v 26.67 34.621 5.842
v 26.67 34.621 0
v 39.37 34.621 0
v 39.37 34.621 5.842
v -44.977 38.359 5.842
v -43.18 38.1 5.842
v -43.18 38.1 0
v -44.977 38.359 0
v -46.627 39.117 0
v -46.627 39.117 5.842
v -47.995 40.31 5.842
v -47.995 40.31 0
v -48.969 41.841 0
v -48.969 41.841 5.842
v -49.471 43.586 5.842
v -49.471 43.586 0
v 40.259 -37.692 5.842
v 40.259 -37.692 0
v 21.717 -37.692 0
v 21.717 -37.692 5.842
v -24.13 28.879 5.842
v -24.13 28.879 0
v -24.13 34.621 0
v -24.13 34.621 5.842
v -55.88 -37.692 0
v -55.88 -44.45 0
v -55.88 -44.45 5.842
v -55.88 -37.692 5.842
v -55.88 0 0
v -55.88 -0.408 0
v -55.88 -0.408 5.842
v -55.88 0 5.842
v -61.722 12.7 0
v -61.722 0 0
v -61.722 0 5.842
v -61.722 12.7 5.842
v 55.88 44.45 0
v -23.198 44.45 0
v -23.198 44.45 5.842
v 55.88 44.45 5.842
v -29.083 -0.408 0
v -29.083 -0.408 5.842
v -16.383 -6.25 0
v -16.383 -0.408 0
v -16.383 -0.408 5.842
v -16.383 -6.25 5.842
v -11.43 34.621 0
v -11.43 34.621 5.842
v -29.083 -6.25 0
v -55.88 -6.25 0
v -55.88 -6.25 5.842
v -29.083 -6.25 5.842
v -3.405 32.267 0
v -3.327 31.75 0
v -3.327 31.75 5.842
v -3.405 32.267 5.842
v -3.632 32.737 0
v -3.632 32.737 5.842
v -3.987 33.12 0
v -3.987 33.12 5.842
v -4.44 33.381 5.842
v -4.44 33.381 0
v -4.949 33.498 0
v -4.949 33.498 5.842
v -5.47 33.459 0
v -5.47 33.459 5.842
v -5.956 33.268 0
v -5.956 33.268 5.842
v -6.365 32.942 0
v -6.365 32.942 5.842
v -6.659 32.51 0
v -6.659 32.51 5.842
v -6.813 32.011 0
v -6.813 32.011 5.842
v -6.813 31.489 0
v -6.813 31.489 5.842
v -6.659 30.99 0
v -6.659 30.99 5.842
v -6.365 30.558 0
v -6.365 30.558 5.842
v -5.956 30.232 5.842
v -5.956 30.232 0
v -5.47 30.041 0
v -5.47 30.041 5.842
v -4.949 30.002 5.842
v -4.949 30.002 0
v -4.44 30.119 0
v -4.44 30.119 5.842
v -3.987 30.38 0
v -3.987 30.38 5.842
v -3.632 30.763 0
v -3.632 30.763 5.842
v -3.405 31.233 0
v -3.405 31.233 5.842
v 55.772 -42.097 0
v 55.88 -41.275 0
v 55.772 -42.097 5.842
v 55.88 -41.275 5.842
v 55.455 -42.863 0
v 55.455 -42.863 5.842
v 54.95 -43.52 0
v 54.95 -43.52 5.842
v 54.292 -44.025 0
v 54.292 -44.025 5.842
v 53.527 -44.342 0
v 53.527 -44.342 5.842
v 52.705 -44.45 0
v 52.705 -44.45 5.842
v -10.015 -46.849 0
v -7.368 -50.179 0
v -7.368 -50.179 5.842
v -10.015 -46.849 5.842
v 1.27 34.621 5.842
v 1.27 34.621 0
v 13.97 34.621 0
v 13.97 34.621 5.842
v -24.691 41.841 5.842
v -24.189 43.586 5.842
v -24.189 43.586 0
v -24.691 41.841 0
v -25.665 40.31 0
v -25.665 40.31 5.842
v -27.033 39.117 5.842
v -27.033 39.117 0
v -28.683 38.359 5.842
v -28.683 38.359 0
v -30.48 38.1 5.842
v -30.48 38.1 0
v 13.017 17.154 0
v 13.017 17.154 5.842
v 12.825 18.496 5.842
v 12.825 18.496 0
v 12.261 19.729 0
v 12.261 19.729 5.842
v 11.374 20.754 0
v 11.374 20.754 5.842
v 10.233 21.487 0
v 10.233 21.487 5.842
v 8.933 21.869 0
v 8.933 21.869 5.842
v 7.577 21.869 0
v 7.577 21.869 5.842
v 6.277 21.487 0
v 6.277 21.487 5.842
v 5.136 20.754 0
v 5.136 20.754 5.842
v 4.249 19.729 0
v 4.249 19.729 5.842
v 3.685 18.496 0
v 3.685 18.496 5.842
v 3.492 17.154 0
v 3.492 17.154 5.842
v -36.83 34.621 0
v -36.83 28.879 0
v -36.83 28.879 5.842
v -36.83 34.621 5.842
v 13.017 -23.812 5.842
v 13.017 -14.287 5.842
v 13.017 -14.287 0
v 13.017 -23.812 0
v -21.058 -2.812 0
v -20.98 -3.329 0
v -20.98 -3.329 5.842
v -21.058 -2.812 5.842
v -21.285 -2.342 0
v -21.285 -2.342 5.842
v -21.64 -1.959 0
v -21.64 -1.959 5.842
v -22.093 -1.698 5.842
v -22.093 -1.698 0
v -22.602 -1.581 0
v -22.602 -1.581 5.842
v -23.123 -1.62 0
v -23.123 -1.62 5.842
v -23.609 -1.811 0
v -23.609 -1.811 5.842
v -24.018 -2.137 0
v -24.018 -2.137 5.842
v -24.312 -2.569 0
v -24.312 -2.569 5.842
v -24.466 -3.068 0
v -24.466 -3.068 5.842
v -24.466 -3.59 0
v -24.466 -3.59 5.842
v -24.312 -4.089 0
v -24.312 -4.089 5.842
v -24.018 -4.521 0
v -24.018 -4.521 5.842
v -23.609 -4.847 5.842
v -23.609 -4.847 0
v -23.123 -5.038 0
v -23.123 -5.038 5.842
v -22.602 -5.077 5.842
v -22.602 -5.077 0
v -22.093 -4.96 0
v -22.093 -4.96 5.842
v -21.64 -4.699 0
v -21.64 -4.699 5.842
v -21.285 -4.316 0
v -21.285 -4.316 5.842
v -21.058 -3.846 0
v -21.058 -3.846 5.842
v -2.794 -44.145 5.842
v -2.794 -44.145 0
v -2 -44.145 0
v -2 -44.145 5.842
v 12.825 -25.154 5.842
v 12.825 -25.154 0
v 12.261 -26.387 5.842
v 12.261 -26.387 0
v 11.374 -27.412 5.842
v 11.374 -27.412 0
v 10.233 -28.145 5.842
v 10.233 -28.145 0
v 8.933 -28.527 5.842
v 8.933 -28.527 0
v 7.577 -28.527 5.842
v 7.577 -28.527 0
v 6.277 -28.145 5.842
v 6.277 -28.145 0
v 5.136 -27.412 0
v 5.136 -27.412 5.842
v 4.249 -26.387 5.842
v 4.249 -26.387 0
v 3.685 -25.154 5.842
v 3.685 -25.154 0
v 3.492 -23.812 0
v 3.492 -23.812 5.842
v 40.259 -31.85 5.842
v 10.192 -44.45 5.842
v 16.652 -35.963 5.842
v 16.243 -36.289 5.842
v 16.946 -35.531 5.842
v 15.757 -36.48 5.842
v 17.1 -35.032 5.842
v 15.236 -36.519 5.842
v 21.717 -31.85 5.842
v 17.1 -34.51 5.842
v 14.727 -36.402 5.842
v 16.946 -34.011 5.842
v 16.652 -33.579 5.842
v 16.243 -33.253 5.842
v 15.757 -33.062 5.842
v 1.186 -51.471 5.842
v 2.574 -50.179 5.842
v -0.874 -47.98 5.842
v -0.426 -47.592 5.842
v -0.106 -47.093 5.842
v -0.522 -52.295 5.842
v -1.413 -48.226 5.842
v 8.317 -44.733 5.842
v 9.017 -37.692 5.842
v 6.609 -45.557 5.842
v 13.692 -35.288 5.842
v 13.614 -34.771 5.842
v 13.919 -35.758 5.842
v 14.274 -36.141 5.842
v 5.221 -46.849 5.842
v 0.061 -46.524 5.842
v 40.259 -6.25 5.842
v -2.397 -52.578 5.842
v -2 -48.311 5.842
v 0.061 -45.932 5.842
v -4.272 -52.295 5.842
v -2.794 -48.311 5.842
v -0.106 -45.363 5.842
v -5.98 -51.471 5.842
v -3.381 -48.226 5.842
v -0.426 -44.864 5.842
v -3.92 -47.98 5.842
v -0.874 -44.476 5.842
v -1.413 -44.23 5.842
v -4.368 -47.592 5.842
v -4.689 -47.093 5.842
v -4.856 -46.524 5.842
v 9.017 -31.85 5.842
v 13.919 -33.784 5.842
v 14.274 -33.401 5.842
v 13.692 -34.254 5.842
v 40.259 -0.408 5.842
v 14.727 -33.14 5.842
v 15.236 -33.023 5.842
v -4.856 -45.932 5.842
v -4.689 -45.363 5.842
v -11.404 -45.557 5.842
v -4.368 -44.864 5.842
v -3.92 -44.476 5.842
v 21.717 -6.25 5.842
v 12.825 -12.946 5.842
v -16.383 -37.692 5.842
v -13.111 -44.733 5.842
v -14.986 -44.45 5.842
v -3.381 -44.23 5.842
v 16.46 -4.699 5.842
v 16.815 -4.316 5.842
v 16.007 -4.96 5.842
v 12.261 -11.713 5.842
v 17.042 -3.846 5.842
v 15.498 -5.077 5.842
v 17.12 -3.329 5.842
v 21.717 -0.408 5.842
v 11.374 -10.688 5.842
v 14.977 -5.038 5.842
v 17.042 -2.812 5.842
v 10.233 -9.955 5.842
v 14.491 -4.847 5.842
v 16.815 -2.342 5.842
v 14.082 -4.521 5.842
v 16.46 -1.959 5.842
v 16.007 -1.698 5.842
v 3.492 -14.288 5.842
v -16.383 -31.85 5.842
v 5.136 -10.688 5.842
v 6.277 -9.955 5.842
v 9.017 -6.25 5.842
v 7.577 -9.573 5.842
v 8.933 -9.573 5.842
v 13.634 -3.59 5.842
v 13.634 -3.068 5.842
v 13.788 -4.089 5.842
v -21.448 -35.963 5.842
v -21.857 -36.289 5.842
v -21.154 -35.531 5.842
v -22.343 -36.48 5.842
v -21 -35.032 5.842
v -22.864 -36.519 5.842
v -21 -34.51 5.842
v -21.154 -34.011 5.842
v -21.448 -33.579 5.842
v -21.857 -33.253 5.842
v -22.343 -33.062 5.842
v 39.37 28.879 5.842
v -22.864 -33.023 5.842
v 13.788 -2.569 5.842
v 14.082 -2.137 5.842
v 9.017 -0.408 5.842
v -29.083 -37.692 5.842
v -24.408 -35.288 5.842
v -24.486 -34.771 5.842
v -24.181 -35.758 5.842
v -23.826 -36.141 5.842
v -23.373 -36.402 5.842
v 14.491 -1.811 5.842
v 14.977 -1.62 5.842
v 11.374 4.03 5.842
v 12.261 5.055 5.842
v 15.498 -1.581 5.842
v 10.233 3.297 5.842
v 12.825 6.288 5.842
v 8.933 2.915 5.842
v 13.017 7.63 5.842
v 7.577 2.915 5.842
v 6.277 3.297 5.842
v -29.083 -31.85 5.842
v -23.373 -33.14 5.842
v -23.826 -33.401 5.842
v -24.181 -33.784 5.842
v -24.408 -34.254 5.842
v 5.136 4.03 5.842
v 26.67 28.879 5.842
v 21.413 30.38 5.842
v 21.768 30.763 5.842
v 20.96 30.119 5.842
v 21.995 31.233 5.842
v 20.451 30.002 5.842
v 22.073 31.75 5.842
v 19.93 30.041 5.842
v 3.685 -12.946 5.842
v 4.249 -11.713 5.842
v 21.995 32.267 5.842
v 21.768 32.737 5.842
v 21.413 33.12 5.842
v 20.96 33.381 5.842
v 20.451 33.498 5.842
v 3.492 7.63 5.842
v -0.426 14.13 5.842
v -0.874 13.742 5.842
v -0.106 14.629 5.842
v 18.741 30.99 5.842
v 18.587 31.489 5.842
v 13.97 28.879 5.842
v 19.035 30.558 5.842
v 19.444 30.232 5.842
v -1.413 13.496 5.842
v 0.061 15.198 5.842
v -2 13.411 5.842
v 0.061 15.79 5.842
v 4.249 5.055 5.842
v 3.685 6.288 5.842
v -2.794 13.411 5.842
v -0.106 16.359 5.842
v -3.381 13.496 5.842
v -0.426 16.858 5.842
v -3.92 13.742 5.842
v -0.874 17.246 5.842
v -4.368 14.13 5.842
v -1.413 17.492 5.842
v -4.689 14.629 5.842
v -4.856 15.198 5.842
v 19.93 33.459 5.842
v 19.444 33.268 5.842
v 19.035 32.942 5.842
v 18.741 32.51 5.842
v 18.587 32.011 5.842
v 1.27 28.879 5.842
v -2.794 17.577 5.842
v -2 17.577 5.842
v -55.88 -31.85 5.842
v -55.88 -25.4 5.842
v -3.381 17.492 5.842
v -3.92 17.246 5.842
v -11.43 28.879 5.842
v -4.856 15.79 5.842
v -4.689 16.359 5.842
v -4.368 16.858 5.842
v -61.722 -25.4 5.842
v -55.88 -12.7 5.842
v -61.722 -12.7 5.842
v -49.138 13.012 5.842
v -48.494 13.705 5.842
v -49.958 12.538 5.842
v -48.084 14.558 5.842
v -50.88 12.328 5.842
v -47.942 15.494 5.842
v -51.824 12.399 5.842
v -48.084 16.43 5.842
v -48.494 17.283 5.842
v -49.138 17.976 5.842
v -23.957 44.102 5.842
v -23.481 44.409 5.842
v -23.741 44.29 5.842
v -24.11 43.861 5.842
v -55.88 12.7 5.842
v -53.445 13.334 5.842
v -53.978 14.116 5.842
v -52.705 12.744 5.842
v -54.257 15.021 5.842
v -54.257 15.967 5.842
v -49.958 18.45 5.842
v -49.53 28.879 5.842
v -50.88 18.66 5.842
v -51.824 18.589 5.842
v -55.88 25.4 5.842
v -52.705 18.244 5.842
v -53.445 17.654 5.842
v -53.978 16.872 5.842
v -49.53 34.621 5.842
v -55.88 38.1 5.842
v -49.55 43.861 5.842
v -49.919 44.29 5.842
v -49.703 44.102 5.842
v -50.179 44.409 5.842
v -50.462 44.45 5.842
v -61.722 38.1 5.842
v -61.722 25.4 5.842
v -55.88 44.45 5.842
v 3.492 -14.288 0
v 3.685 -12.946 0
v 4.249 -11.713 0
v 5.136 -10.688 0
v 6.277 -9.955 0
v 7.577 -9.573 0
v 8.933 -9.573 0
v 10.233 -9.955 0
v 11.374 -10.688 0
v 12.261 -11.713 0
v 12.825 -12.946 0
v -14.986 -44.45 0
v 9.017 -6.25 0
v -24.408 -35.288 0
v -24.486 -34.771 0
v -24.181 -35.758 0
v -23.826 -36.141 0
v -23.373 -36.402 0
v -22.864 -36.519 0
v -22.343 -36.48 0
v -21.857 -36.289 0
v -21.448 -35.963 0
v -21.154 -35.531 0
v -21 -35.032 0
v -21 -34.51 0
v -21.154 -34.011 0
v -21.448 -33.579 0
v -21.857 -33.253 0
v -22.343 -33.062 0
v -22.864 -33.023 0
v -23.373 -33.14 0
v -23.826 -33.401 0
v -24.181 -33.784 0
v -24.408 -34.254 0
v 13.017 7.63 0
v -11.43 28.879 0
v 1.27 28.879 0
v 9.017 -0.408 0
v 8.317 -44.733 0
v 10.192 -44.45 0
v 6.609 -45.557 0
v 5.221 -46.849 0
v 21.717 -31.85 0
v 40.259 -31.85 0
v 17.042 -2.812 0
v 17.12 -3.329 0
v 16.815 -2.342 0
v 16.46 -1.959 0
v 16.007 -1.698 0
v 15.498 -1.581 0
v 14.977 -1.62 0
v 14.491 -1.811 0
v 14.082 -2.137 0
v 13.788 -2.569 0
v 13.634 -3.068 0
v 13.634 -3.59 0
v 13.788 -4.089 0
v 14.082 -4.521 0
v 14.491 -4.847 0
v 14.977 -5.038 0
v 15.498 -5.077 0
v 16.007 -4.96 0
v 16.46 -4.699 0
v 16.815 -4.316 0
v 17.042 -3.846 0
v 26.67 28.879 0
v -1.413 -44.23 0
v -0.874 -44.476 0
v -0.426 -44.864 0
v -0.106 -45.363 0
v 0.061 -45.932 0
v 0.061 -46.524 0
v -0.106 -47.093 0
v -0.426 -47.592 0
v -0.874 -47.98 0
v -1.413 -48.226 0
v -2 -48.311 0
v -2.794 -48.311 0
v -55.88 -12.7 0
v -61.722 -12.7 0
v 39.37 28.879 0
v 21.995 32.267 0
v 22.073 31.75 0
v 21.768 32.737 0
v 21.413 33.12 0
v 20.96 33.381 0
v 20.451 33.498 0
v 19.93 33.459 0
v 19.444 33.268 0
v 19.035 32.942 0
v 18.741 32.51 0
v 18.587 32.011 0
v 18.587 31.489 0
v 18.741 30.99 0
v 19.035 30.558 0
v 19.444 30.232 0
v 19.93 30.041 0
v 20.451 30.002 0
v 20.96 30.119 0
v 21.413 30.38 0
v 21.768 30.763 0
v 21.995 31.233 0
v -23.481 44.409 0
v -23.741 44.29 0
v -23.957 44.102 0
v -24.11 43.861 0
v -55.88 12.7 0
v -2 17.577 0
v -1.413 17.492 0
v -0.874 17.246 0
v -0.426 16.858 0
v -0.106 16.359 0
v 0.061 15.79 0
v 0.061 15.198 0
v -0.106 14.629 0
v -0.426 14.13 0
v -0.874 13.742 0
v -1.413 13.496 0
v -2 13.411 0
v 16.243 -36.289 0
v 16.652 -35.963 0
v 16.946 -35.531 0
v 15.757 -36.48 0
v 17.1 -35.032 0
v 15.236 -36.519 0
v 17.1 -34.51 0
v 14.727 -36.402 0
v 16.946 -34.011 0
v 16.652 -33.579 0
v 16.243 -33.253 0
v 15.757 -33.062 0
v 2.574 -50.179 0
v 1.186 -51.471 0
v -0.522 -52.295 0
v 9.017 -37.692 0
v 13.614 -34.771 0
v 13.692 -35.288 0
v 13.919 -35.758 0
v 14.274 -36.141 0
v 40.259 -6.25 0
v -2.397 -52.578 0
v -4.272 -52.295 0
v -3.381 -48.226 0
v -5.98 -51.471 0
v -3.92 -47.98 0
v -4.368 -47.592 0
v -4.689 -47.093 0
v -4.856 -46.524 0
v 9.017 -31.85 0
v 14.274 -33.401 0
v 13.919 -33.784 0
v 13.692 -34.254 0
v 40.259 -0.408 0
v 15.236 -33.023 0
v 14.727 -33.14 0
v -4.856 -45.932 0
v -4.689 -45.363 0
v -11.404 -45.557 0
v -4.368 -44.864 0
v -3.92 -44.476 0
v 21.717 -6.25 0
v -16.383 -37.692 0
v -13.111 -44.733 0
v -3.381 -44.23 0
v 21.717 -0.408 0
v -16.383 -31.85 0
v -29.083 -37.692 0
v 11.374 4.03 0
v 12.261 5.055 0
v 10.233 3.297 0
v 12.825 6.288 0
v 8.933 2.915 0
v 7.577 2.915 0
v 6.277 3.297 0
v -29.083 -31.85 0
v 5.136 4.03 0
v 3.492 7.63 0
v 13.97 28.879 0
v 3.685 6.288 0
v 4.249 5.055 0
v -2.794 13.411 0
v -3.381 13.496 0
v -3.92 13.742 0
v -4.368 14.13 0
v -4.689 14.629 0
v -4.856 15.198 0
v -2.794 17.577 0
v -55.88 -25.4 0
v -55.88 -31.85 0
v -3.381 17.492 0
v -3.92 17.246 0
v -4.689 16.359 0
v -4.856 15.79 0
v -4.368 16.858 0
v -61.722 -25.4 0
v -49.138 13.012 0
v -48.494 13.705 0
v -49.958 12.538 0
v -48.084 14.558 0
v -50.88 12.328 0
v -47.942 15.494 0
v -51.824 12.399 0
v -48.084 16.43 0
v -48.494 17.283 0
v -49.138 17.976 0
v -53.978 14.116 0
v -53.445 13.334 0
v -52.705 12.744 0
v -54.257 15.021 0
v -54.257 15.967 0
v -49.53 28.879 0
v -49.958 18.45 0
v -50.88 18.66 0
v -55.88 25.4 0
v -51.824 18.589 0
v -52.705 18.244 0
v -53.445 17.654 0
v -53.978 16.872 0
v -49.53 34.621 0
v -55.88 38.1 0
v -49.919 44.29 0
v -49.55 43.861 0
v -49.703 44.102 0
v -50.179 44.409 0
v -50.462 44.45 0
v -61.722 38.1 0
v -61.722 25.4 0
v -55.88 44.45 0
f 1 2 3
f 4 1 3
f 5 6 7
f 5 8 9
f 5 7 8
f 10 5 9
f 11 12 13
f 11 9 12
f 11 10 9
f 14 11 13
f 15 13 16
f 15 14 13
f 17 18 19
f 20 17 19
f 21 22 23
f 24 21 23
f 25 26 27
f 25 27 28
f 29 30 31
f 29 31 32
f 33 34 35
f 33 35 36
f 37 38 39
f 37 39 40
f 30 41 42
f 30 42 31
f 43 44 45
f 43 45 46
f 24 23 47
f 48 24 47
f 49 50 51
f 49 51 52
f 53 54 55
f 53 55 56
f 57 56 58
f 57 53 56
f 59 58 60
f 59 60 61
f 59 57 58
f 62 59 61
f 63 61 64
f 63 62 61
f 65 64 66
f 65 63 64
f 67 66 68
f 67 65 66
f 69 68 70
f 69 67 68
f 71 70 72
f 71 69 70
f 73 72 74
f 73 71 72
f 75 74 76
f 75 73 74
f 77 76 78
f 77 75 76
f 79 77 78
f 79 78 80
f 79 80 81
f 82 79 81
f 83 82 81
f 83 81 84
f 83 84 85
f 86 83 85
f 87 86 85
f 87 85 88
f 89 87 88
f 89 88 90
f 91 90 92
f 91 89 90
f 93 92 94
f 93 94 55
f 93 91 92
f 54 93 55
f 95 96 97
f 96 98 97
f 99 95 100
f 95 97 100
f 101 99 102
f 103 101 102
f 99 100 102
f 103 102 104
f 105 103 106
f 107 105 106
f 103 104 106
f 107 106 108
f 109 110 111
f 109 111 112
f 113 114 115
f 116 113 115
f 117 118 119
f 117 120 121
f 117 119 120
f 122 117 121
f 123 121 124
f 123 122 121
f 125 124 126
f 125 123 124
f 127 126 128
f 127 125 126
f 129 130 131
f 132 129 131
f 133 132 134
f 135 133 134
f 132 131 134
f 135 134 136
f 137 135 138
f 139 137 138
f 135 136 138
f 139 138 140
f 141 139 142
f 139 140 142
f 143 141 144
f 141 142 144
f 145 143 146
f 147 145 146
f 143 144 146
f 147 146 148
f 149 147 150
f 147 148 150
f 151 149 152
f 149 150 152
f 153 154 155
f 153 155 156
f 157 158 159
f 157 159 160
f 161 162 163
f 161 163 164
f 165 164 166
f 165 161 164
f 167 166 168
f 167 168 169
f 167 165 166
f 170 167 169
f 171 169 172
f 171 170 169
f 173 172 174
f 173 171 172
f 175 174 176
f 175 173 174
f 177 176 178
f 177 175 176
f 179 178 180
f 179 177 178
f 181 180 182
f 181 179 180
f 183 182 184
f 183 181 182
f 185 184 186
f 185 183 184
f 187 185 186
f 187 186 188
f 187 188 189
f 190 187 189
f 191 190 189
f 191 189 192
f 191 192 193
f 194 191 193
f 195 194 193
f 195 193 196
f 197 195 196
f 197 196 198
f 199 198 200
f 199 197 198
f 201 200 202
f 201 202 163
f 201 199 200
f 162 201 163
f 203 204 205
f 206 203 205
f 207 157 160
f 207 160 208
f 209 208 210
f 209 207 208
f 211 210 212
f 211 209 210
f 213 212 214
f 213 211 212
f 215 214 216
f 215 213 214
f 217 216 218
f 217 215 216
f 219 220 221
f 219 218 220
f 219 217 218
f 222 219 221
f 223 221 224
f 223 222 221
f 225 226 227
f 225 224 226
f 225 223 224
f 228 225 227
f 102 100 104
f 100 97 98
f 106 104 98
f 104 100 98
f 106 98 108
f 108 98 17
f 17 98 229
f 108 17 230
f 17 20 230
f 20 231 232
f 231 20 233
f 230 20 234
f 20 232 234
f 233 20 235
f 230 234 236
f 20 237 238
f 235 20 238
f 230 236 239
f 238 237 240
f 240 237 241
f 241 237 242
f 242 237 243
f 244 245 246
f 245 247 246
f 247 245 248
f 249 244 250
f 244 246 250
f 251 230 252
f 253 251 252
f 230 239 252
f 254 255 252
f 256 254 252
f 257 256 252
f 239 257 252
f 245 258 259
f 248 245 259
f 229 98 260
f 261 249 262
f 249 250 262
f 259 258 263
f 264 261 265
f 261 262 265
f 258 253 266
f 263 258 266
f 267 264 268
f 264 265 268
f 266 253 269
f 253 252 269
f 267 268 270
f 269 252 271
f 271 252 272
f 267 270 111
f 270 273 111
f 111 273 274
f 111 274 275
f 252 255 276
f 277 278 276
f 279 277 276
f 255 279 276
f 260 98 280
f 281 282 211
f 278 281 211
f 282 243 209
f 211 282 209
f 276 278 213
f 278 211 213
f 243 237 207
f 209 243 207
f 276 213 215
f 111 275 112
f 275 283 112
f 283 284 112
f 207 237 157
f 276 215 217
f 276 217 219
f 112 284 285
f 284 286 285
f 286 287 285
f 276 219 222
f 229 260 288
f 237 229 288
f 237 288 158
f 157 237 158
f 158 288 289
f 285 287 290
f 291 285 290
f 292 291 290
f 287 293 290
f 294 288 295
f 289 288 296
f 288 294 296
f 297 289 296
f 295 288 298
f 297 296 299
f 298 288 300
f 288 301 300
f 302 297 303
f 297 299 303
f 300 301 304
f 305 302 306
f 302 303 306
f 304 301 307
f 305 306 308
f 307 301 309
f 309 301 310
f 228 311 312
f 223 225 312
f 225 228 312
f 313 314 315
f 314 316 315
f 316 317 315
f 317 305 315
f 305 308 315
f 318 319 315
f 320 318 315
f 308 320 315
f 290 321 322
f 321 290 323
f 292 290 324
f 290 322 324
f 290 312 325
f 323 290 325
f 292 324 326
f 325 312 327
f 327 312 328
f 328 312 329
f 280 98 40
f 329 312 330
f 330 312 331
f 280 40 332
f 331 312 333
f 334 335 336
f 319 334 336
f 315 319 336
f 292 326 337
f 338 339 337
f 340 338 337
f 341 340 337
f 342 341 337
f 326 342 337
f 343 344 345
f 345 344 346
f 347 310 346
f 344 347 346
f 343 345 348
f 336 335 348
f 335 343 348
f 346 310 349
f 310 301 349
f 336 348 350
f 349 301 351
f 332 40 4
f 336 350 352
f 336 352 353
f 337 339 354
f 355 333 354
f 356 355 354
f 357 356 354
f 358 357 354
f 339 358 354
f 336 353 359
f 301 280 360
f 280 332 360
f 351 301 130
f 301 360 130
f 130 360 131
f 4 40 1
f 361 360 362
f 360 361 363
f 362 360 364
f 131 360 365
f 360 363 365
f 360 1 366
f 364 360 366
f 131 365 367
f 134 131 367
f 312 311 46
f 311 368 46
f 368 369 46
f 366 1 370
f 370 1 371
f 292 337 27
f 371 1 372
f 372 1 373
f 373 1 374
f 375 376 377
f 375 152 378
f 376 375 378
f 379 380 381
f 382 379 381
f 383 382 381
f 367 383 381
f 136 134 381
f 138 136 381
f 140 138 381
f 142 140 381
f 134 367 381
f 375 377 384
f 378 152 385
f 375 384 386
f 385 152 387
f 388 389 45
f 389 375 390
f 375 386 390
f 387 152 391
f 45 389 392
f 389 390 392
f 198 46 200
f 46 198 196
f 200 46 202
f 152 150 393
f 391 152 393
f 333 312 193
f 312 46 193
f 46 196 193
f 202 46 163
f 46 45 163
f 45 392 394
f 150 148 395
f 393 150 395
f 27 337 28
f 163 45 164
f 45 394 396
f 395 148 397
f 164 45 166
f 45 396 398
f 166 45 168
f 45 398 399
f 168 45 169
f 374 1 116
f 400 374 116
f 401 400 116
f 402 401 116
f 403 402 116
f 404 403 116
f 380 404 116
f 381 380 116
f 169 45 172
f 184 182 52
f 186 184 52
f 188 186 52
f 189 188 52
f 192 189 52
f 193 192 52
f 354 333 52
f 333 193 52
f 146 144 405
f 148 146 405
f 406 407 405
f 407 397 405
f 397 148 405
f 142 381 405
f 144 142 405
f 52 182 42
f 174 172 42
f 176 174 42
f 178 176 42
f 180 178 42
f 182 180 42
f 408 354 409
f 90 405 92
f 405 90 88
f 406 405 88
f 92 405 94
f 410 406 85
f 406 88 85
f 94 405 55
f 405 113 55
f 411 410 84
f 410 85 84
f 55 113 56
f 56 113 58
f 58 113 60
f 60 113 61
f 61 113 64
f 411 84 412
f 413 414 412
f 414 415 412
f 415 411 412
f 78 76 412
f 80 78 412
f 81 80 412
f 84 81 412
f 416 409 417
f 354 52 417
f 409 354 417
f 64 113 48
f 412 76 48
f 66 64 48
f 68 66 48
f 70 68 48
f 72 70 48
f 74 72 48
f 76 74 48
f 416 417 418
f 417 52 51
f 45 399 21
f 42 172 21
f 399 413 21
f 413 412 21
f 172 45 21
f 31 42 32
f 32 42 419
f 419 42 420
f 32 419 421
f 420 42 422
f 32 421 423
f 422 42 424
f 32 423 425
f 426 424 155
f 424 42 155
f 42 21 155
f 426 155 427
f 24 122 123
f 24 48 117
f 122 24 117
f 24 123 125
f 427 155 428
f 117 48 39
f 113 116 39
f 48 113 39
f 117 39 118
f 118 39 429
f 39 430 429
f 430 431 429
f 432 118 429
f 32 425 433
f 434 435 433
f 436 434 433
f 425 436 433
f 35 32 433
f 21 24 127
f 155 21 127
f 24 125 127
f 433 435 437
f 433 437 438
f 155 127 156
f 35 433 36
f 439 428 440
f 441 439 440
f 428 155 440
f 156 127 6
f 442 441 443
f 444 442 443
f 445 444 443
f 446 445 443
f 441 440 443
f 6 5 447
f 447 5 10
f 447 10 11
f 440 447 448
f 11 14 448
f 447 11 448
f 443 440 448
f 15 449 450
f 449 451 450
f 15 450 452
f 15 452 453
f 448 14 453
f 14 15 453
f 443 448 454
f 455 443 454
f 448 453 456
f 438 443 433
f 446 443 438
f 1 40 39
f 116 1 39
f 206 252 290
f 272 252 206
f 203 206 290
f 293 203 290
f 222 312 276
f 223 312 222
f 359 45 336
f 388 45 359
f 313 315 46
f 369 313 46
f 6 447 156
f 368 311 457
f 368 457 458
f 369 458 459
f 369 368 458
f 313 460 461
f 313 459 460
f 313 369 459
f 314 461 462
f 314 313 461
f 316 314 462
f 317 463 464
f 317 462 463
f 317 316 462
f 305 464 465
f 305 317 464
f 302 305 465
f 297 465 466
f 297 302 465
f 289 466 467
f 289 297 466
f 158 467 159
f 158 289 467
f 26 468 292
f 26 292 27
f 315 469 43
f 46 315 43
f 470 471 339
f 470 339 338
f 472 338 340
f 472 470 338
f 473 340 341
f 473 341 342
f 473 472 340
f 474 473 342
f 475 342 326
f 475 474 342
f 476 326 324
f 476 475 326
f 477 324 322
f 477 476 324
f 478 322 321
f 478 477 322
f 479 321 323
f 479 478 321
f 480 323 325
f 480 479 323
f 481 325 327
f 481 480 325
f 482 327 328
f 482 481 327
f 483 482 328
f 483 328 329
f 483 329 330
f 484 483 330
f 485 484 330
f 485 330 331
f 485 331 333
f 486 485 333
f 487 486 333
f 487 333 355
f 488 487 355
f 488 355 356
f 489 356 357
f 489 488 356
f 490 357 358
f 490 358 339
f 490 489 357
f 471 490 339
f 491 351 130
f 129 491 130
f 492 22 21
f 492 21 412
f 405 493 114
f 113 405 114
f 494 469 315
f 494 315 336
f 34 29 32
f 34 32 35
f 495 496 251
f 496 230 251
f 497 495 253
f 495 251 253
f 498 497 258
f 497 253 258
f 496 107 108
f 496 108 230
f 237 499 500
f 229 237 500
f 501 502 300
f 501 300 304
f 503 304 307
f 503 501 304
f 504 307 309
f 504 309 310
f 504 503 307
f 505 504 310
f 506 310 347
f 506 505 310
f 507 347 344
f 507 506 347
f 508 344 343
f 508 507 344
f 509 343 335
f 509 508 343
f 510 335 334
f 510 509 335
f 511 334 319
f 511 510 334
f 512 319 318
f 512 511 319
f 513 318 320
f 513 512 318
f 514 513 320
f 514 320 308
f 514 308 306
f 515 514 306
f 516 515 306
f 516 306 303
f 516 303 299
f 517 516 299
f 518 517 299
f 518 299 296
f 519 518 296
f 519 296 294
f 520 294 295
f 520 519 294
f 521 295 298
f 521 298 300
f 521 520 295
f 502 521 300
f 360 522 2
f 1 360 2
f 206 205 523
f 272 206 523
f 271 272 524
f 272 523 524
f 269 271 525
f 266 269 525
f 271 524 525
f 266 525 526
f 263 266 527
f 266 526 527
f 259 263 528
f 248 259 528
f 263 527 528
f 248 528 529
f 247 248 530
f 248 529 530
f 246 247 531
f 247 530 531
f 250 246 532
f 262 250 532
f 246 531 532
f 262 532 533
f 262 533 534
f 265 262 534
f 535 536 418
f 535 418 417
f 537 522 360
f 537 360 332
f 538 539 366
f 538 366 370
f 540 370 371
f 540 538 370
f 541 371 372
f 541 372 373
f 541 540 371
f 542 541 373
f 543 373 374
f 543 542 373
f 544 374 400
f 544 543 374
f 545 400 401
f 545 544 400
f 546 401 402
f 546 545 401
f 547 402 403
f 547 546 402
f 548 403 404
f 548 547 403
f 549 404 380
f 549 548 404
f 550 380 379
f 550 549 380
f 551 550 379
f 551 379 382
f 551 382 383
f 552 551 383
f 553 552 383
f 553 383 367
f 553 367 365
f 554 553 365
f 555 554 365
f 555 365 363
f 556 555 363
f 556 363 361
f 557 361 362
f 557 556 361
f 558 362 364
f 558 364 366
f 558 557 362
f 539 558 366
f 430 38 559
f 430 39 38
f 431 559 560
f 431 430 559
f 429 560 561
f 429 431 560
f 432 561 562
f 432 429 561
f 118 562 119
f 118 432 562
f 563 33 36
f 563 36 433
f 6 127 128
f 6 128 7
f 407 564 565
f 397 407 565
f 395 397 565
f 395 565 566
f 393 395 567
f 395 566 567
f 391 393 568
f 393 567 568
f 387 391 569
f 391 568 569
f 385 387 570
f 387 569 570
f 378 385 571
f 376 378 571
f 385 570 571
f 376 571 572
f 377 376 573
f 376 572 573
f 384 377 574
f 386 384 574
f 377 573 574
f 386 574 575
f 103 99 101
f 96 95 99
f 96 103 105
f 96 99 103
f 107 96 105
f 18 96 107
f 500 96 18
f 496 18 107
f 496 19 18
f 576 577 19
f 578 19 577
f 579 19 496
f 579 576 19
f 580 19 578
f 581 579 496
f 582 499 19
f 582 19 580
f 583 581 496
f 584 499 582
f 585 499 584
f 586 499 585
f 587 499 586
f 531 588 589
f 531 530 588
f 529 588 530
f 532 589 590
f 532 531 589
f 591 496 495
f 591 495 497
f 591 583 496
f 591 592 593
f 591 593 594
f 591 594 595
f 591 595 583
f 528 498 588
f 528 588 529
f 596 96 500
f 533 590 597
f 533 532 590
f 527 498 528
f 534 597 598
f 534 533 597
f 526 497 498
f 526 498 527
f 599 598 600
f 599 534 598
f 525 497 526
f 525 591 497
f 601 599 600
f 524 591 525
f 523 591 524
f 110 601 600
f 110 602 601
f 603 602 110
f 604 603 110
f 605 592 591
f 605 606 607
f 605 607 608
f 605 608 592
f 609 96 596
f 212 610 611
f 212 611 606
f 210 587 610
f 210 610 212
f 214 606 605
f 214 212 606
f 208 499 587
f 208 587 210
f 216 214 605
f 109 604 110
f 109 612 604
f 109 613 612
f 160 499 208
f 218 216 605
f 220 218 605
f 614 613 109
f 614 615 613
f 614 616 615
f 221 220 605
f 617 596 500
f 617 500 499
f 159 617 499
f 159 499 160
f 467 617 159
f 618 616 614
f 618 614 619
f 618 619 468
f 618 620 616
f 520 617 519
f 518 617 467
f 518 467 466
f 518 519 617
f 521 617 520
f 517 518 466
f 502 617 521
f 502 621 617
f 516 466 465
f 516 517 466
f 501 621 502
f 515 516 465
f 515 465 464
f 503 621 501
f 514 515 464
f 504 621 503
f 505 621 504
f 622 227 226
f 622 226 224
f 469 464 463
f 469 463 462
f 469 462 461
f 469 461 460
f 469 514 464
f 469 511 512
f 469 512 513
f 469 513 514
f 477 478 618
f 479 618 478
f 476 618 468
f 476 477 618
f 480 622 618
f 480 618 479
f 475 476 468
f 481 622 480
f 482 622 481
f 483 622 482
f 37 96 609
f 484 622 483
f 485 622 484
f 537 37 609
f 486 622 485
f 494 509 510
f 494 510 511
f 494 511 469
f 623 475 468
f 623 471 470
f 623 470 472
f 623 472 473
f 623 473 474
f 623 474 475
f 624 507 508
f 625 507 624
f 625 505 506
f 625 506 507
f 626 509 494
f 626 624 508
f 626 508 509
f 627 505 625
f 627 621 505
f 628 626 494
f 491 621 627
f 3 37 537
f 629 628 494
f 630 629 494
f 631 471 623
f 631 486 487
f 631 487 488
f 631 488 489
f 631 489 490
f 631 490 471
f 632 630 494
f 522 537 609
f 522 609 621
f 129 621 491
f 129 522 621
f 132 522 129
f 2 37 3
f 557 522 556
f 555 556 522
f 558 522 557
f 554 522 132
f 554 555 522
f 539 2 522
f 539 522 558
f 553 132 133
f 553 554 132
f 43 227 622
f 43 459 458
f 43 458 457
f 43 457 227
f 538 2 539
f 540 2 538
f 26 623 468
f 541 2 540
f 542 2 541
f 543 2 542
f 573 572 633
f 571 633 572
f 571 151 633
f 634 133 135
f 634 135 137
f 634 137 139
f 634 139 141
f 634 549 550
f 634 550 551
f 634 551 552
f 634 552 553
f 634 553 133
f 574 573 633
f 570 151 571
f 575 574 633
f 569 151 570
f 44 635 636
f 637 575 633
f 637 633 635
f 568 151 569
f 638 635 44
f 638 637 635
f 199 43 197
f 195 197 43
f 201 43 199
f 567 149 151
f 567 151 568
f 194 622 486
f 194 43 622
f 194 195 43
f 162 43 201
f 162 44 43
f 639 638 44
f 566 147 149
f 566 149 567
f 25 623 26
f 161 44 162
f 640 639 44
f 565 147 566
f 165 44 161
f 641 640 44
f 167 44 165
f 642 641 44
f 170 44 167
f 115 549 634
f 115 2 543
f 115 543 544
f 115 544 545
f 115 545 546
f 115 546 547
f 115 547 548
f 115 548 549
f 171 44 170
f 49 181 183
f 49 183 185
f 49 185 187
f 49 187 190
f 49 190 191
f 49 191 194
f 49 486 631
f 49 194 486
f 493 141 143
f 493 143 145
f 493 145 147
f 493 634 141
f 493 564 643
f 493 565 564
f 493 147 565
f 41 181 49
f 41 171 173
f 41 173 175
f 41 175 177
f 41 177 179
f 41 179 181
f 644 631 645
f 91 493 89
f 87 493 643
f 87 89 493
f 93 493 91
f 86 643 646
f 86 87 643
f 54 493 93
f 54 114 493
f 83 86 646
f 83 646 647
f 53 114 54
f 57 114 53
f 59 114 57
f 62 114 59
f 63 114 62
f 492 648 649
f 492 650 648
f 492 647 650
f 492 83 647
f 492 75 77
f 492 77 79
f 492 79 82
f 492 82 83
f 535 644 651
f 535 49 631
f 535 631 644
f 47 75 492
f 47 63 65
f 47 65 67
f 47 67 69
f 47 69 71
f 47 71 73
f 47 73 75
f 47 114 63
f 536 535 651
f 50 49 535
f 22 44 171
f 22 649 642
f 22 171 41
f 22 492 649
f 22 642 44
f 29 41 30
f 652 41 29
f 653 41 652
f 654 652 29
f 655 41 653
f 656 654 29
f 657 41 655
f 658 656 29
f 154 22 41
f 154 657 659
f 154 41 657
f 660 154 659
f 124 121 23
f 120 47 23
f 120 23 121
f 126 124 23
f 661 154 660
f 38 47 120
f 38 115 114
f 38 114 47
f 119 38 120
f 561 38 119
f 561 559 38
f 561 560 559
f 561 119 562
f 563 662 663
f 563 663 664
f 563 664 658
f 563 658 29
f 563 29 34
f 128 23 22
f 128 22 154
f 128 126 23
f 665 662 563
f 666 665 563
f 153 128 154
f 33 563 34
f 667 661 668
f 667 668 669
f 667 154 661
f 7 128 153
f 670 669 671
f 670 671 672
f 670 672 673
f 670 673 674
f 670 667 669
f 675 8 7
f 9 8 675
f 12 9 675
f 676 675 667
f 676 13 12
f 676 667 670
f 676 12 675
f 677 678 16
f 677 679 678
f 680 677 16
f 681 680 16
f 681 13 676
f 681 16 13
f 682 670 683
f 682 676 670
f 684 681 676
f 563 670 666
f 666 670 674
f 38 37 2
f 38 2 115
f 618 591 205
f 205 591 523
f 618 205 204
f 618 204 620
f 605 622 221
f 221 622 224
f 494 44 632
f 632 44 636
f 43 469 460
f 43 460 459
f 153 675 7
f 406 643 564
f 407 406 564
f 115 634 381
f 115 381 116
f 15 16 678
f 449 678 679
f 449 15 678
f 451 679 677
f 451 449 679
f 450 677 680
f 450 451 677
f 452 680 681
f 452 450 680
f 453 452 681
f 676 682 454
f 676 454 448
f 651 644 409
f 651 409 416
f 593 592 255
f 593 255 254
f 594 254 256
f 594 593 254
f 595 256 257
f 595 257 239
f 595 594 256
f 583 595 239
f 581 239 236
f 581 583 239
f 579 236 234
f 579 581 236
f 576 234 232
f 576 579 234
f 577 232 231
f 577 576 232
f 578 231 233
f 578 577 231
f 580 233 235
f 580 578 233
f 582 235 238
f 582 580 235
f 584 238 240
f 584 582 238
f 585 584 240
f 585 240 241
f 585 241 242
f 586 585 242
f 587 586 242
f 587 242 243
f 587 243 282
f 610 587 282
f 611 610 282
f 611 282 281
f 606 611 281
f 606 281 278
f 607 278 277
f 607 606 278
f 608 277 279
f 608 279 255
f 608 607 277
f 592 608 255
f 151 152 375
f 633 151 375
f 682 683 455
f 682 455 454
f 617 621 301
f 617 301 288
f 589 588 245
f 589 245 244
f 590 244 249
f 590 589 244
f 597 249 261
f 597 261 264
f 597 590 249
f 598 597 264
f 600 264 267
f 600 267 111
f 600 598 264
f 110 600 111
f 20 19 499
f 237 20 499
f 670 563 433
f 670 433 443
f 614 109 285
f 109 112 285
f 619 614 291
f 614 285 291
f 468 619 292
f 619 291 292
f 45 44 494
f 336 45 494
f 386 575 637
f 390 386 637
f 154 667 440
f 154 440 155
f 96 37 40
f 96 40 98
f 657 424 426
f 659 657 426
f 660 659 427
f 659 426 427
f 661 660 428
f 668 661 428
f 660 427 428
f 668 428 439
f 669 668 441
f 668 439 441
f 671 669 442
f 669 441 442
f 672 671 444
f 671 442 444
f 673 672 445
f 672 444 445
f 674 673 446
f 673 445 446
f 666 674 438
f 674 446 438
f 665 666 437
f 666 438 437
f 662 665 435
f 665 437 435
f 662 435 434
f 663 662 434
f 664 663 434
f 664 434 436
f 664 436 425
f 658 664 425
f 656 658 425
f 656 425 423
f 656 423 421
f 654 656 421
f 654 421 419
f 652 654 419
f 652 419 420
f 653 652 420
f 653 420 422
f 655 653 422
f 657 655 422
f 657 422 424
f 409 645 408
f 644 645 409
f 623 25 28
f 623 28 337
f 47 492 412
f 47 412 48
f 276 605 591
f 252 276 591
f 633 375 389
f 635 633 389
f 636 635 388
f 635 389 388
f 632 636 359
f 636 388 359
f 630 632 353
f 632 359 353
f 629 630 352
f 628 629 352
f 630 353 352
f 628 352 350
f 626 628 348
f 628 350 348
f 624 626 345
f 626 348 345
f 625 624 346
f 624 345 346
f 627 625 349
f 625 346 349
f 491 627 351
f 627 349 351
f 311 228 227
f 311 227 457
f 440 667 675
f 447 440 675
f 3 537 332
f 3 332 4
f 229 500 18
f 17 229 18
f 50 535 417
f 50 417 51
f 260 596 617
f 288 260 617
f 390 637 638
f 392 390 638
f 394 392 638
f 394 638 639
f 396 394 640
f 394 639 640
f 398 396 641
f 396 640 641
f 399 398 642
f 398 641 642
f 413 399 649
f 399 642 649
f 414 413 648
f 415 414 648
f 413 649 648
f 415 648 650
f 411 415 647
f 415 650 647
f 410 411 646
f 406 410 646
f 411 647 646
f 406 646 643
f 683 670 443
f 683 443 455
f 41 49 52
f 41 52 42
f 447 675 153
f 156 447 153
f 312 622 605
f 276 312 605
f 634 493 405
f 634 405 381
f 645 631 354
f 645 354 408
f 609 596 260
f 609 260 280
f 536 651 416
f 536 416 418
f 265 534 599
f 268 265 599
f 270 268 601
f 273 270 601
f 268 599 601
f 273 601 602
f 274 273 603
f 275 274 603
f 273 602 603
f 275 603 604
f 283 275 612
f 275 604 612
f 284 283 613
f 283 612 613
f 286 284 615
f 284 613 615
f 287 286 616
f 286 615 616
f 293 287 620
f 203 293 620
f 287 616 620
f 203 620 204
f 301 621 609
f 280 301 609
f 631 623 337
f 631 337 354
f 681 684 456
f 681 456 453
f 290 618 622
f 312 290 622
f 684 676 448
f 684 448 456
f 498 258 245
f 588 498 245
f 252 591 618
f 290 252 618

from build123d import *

# Parameters (mm, degrees)
SKETCH1_R           = 1.7526
SKETCH1_W           = 12.7
SKETCH1_H           = 5.742
BOSS_EXTRUDE1_DEPTH = 5.842
SKETCH2_R           = 3.175
CUT_EXTRUDE1_DEPTH  = 82.290714919
FILLET1_R           = 6.35
CUT_EXTRUDE2_DEPTH  = 82.290714919
FILLET2_R           = 1
FILLET3_R           = 3.175
CUT_EXTRUDE3_DEPTH  = 82.290714919


with BuildPart() as part:
    # Sketch1 → Boss-Extrude1 (new body)
    with BuildSketch(Plane.XY):
        with BuildLine():
            Line((-61.722, 0), (-61.722, 12.7))
            Line((-61.722, 12.7), (-55.88, 12.7))
            Line((-55.88, 12.7), (-55.88, 25.4))
            Line((-55.88, 25.4), (-61.722, 25.4))
            Line((-61.722, 25.4), (-61.722, 38.1))
            Line((-61.722, 38.1), (-55.88, 38.1))
            Line((-55.88, 38.1), (-55.88, 44.45))
            Line((-55.88, 44.45), (55.88, 44.45))
            Line((55.88, 44.45), (55.88, -44.45))
            Line((55.88, -44.45), (7.127875, -44.45))
            Line((7.127875, -44.45), (2.573780292, -50.179278348))
            ThreePointArc((2.573780292, -50.179278348), (-2.397125, -52.578), (-7.368030292, -50.179278348))
            Line((-7.368030292, -50.179278348), (-11.922125, -44.45))
            Line((-11.922125, -44.45), (-55.88, -44.45))
            Line((-55.88, -44.45), (-55.88, -37.692))
            Line((-55.88, -37.692), (-29.083, -37.692))
            Line((-29.083, -37.692), (-29.083, -31.85))
            Line((-29.083, -31.85), (-55.88, -31.85))
            Line((-55.88, -31.85), (-55.88, -25.4))
            Line((-55.88, -25.4), (-61.722, -25.4))
            Line((-61.722, -25.4), (-61.722, -12.7))
            Line((-61.722, -12.7), (-55.88, -12.7))
            Line((-55.88, -12.7), (-55.88, -6.25))
            Line((-55.88, -6.25), (-29.083, -6.25))
            Line((-29.083, -6.25), (-29.083, -0.408))
            Line((-29.083, -0.408), (-55.88, -0.408))
            Line((-55.88, -0.408), (-55.88, 0))
            Line((-55.88, 0), (-61.722, 0))
        make_face()
        with Locations((-22.733, -3.329)):
            Circle(SKETCH1_R, mode=Mode.SUBTRACT)
        with Locations((15.367, -3.329)):
            Circle(SKETCH1_R, mode=Mode.SUBTRACT)
        with Locations(Location((15.367, -34.771, 0), (0, 0, 180))):
            Circle(SKETCH1_R, mode=Mode.SUBTRACT)
        with Locations(Location((-22.733, -34.771, 0), (0, 0, 180))):
            Circle(SKETCH1_R, mode=Mode.SUBTRACT)
        with Locations((-5.08, 31.75)):
            Circle(SKETCH1_R, mode=Mode.SUBTRACT)
        with Locations((20.32, 31.75)):
            Circle(SKETCH1_R, mode=Mode.SUBTRACT)
        Polygon((9.017, -0.408), (-10.541, -0.408), (-16.383, -0.408), (-16.383, -6.25), (-10.541, -6.25), (9.017, -6.25), align=None, mode=Mode.SUBTRACT)
        Polygon((27.559, -0.408), (21.717, -0.408), (21.717, -6.25), (27.559, -6.25), (40.259, -6.25), (40.259, -0.408), align=None, mode=Mode.SUBTRACT)
        Polygon((21.717, -37.692), (21.717, -31.85), (27.559, -31.85), (40.259, -31.85), (40.259, -37.692), (27.559, -37.692), align=None, mode=Mode.SUBTRACT)
        Polygon((-16.383, -37.692), (-16.383, -31.85), (-10.541, -31.85), (9.017, -31.85), (9.017, -37.692), (-10.541, -37.692), align=None, mode=Mode.SUBTRACT)
        with BuildLine():
            Line((-2.794, -44.1452), (-2.00025, -44.1452))
            ThreePointArc((-2.00025, -44.1452), (0.08255, -46.228), (-2.00025, -48.3108))
            Line((-2.00025, -48.3108), (-2.794, -48.3108))
            ThreePointArc((-2.794, -48.3108), (-4.8768, -46.228), (-2.794, -44.1452))
        make_face(mode=Mode.SUBTRACT)
        with BuildLine():
            Line((-2.794, 17.5768), (-2.00025, 17.5768))
            ThreePointArc((-2.00025, 17.5768), (0.08255, 15.494), (-2.00025, 13.4112))
            Line((-2.00025, 13.4112), (-2.794, 13.4112))
            ThreePointArc((-2.794, 13.4112), (-4.8768, 15.494), (-2.794, 17.5768))
        make_face(mode=Mode.SUBTRACT)
        with Locations((-17.78, 31.75)):
            Rectangle(SKETCH1_W, SKETCH1_H, mode=Mode.SUBTRACT)
        with Locations((-43.18, 31.75)):
            Rectangle(SKETCH1_W, SKETCH1_H, mode=Mode.SUBTRACT)
        with Locations((7.62, 31.75)):
            Rectangle(SKETCH1_W, SKETCH1_H, mode=Mode.SUBTRACT)
        with Locations((33.02, 31.75)):
            Rectangle(SKETCH1_W, SKETCH1_H, mode=Mode.SUBTRACT)
    extrude(amount=BOSS_EXTRUDE1_DEPTH)

    # Sketch2 → Cut-Extrude1 (cut, through all)
    with BuildSketch(Plane.XY.offset(5.842)):
        with Locations((-51.1175, 15.494)):
            Circle(SKETCH2_R)
    extrude(amount=-CUT_EXTRUDE1_DEPTH, mode=Mode.SUBTRACT)

    # Fillet1
    fillet1_edges = [part.edges().sort_by_distance(p)[0] for p in [
        (7.127875, -44.45, 2.921),
        (-11.922125, -44.45, 2.921),
    ]]
    fillet(fillet1_edges, radius=FILLET1_R)

    # Sketch4 → Cut-Extrude2 (cut, through all)
    with BuildSketch(Plane.XY.offset(5.842)):
        with BuildLine():
            Line((-43.18, 50.8), (-30.48, 50.8))
            ThreePointArc((-30.48, 50.8), (-24.13, 44.45), (-30.48, 38.1))
            Line((-30.48, 38.1), (-43.18, 38.1))
            ThreePointArc((-43.18, 38.1), (-49.53, 44.45), (-43.18, 50.8))
        make_face()
    extrude(amount=-CUT_EXTRUDE2_DEPTH, mode=Mode.SUBTRACT)

    # Fillet2
    fillet2_edges = [part.edges().sort_by_distance(p)[0] for p in [
        (-24.13, 44.45, 2.921),
        (-49.53, 44.45, 2.921),
    ]]
    fillet(fillet2_edges, radius=FILLET2_R)

    # Fillet3
    fillet3_edges = [part.edges().sort_by_distance(p)[0] for p in [
        (55.88, -44.45, 2.921),
    ]]
    fillet(fillet3_edges, radius=FILLET3_R)

    # Sketch5 → Cut-Extrude3 (cut, through all)
    with BuildSketch(Plane.XY.offset(5.842)):
        with BuildLine():
            Line((3.4925, -23.8125), (3.4925, -14.2875))
            ThreePointArc((3.4925, -14.2875), (8.255, -9.525), (13.0175, -14.2875))
            Line((13.0175, -14.2875), (13.0175, -23.8125))
            ThreePointArc((13.0175, -23.8125), (8.255, -28.575), (3.4925, -23.8125))
        make_face()
        with BuildLine():
            Line((3.4925, 17.1545), (3.4925, 7.6295))
            ThreePointArc((3.4925, 7.6295), (8.255, 2.867), (13.0175, 7.6295))
            Line((13.0175, 7.6295), (13.0175, 17.1545))
            ThreePointArc((13.0175, 17.1545), (8.255, 21.917), (3.4925, 17.1545))
        make_face()
    extrude(amount=-CUT_EXTRUDE3_DEPTH, mode=Mode.SUBTRACT)


solid = part.part
